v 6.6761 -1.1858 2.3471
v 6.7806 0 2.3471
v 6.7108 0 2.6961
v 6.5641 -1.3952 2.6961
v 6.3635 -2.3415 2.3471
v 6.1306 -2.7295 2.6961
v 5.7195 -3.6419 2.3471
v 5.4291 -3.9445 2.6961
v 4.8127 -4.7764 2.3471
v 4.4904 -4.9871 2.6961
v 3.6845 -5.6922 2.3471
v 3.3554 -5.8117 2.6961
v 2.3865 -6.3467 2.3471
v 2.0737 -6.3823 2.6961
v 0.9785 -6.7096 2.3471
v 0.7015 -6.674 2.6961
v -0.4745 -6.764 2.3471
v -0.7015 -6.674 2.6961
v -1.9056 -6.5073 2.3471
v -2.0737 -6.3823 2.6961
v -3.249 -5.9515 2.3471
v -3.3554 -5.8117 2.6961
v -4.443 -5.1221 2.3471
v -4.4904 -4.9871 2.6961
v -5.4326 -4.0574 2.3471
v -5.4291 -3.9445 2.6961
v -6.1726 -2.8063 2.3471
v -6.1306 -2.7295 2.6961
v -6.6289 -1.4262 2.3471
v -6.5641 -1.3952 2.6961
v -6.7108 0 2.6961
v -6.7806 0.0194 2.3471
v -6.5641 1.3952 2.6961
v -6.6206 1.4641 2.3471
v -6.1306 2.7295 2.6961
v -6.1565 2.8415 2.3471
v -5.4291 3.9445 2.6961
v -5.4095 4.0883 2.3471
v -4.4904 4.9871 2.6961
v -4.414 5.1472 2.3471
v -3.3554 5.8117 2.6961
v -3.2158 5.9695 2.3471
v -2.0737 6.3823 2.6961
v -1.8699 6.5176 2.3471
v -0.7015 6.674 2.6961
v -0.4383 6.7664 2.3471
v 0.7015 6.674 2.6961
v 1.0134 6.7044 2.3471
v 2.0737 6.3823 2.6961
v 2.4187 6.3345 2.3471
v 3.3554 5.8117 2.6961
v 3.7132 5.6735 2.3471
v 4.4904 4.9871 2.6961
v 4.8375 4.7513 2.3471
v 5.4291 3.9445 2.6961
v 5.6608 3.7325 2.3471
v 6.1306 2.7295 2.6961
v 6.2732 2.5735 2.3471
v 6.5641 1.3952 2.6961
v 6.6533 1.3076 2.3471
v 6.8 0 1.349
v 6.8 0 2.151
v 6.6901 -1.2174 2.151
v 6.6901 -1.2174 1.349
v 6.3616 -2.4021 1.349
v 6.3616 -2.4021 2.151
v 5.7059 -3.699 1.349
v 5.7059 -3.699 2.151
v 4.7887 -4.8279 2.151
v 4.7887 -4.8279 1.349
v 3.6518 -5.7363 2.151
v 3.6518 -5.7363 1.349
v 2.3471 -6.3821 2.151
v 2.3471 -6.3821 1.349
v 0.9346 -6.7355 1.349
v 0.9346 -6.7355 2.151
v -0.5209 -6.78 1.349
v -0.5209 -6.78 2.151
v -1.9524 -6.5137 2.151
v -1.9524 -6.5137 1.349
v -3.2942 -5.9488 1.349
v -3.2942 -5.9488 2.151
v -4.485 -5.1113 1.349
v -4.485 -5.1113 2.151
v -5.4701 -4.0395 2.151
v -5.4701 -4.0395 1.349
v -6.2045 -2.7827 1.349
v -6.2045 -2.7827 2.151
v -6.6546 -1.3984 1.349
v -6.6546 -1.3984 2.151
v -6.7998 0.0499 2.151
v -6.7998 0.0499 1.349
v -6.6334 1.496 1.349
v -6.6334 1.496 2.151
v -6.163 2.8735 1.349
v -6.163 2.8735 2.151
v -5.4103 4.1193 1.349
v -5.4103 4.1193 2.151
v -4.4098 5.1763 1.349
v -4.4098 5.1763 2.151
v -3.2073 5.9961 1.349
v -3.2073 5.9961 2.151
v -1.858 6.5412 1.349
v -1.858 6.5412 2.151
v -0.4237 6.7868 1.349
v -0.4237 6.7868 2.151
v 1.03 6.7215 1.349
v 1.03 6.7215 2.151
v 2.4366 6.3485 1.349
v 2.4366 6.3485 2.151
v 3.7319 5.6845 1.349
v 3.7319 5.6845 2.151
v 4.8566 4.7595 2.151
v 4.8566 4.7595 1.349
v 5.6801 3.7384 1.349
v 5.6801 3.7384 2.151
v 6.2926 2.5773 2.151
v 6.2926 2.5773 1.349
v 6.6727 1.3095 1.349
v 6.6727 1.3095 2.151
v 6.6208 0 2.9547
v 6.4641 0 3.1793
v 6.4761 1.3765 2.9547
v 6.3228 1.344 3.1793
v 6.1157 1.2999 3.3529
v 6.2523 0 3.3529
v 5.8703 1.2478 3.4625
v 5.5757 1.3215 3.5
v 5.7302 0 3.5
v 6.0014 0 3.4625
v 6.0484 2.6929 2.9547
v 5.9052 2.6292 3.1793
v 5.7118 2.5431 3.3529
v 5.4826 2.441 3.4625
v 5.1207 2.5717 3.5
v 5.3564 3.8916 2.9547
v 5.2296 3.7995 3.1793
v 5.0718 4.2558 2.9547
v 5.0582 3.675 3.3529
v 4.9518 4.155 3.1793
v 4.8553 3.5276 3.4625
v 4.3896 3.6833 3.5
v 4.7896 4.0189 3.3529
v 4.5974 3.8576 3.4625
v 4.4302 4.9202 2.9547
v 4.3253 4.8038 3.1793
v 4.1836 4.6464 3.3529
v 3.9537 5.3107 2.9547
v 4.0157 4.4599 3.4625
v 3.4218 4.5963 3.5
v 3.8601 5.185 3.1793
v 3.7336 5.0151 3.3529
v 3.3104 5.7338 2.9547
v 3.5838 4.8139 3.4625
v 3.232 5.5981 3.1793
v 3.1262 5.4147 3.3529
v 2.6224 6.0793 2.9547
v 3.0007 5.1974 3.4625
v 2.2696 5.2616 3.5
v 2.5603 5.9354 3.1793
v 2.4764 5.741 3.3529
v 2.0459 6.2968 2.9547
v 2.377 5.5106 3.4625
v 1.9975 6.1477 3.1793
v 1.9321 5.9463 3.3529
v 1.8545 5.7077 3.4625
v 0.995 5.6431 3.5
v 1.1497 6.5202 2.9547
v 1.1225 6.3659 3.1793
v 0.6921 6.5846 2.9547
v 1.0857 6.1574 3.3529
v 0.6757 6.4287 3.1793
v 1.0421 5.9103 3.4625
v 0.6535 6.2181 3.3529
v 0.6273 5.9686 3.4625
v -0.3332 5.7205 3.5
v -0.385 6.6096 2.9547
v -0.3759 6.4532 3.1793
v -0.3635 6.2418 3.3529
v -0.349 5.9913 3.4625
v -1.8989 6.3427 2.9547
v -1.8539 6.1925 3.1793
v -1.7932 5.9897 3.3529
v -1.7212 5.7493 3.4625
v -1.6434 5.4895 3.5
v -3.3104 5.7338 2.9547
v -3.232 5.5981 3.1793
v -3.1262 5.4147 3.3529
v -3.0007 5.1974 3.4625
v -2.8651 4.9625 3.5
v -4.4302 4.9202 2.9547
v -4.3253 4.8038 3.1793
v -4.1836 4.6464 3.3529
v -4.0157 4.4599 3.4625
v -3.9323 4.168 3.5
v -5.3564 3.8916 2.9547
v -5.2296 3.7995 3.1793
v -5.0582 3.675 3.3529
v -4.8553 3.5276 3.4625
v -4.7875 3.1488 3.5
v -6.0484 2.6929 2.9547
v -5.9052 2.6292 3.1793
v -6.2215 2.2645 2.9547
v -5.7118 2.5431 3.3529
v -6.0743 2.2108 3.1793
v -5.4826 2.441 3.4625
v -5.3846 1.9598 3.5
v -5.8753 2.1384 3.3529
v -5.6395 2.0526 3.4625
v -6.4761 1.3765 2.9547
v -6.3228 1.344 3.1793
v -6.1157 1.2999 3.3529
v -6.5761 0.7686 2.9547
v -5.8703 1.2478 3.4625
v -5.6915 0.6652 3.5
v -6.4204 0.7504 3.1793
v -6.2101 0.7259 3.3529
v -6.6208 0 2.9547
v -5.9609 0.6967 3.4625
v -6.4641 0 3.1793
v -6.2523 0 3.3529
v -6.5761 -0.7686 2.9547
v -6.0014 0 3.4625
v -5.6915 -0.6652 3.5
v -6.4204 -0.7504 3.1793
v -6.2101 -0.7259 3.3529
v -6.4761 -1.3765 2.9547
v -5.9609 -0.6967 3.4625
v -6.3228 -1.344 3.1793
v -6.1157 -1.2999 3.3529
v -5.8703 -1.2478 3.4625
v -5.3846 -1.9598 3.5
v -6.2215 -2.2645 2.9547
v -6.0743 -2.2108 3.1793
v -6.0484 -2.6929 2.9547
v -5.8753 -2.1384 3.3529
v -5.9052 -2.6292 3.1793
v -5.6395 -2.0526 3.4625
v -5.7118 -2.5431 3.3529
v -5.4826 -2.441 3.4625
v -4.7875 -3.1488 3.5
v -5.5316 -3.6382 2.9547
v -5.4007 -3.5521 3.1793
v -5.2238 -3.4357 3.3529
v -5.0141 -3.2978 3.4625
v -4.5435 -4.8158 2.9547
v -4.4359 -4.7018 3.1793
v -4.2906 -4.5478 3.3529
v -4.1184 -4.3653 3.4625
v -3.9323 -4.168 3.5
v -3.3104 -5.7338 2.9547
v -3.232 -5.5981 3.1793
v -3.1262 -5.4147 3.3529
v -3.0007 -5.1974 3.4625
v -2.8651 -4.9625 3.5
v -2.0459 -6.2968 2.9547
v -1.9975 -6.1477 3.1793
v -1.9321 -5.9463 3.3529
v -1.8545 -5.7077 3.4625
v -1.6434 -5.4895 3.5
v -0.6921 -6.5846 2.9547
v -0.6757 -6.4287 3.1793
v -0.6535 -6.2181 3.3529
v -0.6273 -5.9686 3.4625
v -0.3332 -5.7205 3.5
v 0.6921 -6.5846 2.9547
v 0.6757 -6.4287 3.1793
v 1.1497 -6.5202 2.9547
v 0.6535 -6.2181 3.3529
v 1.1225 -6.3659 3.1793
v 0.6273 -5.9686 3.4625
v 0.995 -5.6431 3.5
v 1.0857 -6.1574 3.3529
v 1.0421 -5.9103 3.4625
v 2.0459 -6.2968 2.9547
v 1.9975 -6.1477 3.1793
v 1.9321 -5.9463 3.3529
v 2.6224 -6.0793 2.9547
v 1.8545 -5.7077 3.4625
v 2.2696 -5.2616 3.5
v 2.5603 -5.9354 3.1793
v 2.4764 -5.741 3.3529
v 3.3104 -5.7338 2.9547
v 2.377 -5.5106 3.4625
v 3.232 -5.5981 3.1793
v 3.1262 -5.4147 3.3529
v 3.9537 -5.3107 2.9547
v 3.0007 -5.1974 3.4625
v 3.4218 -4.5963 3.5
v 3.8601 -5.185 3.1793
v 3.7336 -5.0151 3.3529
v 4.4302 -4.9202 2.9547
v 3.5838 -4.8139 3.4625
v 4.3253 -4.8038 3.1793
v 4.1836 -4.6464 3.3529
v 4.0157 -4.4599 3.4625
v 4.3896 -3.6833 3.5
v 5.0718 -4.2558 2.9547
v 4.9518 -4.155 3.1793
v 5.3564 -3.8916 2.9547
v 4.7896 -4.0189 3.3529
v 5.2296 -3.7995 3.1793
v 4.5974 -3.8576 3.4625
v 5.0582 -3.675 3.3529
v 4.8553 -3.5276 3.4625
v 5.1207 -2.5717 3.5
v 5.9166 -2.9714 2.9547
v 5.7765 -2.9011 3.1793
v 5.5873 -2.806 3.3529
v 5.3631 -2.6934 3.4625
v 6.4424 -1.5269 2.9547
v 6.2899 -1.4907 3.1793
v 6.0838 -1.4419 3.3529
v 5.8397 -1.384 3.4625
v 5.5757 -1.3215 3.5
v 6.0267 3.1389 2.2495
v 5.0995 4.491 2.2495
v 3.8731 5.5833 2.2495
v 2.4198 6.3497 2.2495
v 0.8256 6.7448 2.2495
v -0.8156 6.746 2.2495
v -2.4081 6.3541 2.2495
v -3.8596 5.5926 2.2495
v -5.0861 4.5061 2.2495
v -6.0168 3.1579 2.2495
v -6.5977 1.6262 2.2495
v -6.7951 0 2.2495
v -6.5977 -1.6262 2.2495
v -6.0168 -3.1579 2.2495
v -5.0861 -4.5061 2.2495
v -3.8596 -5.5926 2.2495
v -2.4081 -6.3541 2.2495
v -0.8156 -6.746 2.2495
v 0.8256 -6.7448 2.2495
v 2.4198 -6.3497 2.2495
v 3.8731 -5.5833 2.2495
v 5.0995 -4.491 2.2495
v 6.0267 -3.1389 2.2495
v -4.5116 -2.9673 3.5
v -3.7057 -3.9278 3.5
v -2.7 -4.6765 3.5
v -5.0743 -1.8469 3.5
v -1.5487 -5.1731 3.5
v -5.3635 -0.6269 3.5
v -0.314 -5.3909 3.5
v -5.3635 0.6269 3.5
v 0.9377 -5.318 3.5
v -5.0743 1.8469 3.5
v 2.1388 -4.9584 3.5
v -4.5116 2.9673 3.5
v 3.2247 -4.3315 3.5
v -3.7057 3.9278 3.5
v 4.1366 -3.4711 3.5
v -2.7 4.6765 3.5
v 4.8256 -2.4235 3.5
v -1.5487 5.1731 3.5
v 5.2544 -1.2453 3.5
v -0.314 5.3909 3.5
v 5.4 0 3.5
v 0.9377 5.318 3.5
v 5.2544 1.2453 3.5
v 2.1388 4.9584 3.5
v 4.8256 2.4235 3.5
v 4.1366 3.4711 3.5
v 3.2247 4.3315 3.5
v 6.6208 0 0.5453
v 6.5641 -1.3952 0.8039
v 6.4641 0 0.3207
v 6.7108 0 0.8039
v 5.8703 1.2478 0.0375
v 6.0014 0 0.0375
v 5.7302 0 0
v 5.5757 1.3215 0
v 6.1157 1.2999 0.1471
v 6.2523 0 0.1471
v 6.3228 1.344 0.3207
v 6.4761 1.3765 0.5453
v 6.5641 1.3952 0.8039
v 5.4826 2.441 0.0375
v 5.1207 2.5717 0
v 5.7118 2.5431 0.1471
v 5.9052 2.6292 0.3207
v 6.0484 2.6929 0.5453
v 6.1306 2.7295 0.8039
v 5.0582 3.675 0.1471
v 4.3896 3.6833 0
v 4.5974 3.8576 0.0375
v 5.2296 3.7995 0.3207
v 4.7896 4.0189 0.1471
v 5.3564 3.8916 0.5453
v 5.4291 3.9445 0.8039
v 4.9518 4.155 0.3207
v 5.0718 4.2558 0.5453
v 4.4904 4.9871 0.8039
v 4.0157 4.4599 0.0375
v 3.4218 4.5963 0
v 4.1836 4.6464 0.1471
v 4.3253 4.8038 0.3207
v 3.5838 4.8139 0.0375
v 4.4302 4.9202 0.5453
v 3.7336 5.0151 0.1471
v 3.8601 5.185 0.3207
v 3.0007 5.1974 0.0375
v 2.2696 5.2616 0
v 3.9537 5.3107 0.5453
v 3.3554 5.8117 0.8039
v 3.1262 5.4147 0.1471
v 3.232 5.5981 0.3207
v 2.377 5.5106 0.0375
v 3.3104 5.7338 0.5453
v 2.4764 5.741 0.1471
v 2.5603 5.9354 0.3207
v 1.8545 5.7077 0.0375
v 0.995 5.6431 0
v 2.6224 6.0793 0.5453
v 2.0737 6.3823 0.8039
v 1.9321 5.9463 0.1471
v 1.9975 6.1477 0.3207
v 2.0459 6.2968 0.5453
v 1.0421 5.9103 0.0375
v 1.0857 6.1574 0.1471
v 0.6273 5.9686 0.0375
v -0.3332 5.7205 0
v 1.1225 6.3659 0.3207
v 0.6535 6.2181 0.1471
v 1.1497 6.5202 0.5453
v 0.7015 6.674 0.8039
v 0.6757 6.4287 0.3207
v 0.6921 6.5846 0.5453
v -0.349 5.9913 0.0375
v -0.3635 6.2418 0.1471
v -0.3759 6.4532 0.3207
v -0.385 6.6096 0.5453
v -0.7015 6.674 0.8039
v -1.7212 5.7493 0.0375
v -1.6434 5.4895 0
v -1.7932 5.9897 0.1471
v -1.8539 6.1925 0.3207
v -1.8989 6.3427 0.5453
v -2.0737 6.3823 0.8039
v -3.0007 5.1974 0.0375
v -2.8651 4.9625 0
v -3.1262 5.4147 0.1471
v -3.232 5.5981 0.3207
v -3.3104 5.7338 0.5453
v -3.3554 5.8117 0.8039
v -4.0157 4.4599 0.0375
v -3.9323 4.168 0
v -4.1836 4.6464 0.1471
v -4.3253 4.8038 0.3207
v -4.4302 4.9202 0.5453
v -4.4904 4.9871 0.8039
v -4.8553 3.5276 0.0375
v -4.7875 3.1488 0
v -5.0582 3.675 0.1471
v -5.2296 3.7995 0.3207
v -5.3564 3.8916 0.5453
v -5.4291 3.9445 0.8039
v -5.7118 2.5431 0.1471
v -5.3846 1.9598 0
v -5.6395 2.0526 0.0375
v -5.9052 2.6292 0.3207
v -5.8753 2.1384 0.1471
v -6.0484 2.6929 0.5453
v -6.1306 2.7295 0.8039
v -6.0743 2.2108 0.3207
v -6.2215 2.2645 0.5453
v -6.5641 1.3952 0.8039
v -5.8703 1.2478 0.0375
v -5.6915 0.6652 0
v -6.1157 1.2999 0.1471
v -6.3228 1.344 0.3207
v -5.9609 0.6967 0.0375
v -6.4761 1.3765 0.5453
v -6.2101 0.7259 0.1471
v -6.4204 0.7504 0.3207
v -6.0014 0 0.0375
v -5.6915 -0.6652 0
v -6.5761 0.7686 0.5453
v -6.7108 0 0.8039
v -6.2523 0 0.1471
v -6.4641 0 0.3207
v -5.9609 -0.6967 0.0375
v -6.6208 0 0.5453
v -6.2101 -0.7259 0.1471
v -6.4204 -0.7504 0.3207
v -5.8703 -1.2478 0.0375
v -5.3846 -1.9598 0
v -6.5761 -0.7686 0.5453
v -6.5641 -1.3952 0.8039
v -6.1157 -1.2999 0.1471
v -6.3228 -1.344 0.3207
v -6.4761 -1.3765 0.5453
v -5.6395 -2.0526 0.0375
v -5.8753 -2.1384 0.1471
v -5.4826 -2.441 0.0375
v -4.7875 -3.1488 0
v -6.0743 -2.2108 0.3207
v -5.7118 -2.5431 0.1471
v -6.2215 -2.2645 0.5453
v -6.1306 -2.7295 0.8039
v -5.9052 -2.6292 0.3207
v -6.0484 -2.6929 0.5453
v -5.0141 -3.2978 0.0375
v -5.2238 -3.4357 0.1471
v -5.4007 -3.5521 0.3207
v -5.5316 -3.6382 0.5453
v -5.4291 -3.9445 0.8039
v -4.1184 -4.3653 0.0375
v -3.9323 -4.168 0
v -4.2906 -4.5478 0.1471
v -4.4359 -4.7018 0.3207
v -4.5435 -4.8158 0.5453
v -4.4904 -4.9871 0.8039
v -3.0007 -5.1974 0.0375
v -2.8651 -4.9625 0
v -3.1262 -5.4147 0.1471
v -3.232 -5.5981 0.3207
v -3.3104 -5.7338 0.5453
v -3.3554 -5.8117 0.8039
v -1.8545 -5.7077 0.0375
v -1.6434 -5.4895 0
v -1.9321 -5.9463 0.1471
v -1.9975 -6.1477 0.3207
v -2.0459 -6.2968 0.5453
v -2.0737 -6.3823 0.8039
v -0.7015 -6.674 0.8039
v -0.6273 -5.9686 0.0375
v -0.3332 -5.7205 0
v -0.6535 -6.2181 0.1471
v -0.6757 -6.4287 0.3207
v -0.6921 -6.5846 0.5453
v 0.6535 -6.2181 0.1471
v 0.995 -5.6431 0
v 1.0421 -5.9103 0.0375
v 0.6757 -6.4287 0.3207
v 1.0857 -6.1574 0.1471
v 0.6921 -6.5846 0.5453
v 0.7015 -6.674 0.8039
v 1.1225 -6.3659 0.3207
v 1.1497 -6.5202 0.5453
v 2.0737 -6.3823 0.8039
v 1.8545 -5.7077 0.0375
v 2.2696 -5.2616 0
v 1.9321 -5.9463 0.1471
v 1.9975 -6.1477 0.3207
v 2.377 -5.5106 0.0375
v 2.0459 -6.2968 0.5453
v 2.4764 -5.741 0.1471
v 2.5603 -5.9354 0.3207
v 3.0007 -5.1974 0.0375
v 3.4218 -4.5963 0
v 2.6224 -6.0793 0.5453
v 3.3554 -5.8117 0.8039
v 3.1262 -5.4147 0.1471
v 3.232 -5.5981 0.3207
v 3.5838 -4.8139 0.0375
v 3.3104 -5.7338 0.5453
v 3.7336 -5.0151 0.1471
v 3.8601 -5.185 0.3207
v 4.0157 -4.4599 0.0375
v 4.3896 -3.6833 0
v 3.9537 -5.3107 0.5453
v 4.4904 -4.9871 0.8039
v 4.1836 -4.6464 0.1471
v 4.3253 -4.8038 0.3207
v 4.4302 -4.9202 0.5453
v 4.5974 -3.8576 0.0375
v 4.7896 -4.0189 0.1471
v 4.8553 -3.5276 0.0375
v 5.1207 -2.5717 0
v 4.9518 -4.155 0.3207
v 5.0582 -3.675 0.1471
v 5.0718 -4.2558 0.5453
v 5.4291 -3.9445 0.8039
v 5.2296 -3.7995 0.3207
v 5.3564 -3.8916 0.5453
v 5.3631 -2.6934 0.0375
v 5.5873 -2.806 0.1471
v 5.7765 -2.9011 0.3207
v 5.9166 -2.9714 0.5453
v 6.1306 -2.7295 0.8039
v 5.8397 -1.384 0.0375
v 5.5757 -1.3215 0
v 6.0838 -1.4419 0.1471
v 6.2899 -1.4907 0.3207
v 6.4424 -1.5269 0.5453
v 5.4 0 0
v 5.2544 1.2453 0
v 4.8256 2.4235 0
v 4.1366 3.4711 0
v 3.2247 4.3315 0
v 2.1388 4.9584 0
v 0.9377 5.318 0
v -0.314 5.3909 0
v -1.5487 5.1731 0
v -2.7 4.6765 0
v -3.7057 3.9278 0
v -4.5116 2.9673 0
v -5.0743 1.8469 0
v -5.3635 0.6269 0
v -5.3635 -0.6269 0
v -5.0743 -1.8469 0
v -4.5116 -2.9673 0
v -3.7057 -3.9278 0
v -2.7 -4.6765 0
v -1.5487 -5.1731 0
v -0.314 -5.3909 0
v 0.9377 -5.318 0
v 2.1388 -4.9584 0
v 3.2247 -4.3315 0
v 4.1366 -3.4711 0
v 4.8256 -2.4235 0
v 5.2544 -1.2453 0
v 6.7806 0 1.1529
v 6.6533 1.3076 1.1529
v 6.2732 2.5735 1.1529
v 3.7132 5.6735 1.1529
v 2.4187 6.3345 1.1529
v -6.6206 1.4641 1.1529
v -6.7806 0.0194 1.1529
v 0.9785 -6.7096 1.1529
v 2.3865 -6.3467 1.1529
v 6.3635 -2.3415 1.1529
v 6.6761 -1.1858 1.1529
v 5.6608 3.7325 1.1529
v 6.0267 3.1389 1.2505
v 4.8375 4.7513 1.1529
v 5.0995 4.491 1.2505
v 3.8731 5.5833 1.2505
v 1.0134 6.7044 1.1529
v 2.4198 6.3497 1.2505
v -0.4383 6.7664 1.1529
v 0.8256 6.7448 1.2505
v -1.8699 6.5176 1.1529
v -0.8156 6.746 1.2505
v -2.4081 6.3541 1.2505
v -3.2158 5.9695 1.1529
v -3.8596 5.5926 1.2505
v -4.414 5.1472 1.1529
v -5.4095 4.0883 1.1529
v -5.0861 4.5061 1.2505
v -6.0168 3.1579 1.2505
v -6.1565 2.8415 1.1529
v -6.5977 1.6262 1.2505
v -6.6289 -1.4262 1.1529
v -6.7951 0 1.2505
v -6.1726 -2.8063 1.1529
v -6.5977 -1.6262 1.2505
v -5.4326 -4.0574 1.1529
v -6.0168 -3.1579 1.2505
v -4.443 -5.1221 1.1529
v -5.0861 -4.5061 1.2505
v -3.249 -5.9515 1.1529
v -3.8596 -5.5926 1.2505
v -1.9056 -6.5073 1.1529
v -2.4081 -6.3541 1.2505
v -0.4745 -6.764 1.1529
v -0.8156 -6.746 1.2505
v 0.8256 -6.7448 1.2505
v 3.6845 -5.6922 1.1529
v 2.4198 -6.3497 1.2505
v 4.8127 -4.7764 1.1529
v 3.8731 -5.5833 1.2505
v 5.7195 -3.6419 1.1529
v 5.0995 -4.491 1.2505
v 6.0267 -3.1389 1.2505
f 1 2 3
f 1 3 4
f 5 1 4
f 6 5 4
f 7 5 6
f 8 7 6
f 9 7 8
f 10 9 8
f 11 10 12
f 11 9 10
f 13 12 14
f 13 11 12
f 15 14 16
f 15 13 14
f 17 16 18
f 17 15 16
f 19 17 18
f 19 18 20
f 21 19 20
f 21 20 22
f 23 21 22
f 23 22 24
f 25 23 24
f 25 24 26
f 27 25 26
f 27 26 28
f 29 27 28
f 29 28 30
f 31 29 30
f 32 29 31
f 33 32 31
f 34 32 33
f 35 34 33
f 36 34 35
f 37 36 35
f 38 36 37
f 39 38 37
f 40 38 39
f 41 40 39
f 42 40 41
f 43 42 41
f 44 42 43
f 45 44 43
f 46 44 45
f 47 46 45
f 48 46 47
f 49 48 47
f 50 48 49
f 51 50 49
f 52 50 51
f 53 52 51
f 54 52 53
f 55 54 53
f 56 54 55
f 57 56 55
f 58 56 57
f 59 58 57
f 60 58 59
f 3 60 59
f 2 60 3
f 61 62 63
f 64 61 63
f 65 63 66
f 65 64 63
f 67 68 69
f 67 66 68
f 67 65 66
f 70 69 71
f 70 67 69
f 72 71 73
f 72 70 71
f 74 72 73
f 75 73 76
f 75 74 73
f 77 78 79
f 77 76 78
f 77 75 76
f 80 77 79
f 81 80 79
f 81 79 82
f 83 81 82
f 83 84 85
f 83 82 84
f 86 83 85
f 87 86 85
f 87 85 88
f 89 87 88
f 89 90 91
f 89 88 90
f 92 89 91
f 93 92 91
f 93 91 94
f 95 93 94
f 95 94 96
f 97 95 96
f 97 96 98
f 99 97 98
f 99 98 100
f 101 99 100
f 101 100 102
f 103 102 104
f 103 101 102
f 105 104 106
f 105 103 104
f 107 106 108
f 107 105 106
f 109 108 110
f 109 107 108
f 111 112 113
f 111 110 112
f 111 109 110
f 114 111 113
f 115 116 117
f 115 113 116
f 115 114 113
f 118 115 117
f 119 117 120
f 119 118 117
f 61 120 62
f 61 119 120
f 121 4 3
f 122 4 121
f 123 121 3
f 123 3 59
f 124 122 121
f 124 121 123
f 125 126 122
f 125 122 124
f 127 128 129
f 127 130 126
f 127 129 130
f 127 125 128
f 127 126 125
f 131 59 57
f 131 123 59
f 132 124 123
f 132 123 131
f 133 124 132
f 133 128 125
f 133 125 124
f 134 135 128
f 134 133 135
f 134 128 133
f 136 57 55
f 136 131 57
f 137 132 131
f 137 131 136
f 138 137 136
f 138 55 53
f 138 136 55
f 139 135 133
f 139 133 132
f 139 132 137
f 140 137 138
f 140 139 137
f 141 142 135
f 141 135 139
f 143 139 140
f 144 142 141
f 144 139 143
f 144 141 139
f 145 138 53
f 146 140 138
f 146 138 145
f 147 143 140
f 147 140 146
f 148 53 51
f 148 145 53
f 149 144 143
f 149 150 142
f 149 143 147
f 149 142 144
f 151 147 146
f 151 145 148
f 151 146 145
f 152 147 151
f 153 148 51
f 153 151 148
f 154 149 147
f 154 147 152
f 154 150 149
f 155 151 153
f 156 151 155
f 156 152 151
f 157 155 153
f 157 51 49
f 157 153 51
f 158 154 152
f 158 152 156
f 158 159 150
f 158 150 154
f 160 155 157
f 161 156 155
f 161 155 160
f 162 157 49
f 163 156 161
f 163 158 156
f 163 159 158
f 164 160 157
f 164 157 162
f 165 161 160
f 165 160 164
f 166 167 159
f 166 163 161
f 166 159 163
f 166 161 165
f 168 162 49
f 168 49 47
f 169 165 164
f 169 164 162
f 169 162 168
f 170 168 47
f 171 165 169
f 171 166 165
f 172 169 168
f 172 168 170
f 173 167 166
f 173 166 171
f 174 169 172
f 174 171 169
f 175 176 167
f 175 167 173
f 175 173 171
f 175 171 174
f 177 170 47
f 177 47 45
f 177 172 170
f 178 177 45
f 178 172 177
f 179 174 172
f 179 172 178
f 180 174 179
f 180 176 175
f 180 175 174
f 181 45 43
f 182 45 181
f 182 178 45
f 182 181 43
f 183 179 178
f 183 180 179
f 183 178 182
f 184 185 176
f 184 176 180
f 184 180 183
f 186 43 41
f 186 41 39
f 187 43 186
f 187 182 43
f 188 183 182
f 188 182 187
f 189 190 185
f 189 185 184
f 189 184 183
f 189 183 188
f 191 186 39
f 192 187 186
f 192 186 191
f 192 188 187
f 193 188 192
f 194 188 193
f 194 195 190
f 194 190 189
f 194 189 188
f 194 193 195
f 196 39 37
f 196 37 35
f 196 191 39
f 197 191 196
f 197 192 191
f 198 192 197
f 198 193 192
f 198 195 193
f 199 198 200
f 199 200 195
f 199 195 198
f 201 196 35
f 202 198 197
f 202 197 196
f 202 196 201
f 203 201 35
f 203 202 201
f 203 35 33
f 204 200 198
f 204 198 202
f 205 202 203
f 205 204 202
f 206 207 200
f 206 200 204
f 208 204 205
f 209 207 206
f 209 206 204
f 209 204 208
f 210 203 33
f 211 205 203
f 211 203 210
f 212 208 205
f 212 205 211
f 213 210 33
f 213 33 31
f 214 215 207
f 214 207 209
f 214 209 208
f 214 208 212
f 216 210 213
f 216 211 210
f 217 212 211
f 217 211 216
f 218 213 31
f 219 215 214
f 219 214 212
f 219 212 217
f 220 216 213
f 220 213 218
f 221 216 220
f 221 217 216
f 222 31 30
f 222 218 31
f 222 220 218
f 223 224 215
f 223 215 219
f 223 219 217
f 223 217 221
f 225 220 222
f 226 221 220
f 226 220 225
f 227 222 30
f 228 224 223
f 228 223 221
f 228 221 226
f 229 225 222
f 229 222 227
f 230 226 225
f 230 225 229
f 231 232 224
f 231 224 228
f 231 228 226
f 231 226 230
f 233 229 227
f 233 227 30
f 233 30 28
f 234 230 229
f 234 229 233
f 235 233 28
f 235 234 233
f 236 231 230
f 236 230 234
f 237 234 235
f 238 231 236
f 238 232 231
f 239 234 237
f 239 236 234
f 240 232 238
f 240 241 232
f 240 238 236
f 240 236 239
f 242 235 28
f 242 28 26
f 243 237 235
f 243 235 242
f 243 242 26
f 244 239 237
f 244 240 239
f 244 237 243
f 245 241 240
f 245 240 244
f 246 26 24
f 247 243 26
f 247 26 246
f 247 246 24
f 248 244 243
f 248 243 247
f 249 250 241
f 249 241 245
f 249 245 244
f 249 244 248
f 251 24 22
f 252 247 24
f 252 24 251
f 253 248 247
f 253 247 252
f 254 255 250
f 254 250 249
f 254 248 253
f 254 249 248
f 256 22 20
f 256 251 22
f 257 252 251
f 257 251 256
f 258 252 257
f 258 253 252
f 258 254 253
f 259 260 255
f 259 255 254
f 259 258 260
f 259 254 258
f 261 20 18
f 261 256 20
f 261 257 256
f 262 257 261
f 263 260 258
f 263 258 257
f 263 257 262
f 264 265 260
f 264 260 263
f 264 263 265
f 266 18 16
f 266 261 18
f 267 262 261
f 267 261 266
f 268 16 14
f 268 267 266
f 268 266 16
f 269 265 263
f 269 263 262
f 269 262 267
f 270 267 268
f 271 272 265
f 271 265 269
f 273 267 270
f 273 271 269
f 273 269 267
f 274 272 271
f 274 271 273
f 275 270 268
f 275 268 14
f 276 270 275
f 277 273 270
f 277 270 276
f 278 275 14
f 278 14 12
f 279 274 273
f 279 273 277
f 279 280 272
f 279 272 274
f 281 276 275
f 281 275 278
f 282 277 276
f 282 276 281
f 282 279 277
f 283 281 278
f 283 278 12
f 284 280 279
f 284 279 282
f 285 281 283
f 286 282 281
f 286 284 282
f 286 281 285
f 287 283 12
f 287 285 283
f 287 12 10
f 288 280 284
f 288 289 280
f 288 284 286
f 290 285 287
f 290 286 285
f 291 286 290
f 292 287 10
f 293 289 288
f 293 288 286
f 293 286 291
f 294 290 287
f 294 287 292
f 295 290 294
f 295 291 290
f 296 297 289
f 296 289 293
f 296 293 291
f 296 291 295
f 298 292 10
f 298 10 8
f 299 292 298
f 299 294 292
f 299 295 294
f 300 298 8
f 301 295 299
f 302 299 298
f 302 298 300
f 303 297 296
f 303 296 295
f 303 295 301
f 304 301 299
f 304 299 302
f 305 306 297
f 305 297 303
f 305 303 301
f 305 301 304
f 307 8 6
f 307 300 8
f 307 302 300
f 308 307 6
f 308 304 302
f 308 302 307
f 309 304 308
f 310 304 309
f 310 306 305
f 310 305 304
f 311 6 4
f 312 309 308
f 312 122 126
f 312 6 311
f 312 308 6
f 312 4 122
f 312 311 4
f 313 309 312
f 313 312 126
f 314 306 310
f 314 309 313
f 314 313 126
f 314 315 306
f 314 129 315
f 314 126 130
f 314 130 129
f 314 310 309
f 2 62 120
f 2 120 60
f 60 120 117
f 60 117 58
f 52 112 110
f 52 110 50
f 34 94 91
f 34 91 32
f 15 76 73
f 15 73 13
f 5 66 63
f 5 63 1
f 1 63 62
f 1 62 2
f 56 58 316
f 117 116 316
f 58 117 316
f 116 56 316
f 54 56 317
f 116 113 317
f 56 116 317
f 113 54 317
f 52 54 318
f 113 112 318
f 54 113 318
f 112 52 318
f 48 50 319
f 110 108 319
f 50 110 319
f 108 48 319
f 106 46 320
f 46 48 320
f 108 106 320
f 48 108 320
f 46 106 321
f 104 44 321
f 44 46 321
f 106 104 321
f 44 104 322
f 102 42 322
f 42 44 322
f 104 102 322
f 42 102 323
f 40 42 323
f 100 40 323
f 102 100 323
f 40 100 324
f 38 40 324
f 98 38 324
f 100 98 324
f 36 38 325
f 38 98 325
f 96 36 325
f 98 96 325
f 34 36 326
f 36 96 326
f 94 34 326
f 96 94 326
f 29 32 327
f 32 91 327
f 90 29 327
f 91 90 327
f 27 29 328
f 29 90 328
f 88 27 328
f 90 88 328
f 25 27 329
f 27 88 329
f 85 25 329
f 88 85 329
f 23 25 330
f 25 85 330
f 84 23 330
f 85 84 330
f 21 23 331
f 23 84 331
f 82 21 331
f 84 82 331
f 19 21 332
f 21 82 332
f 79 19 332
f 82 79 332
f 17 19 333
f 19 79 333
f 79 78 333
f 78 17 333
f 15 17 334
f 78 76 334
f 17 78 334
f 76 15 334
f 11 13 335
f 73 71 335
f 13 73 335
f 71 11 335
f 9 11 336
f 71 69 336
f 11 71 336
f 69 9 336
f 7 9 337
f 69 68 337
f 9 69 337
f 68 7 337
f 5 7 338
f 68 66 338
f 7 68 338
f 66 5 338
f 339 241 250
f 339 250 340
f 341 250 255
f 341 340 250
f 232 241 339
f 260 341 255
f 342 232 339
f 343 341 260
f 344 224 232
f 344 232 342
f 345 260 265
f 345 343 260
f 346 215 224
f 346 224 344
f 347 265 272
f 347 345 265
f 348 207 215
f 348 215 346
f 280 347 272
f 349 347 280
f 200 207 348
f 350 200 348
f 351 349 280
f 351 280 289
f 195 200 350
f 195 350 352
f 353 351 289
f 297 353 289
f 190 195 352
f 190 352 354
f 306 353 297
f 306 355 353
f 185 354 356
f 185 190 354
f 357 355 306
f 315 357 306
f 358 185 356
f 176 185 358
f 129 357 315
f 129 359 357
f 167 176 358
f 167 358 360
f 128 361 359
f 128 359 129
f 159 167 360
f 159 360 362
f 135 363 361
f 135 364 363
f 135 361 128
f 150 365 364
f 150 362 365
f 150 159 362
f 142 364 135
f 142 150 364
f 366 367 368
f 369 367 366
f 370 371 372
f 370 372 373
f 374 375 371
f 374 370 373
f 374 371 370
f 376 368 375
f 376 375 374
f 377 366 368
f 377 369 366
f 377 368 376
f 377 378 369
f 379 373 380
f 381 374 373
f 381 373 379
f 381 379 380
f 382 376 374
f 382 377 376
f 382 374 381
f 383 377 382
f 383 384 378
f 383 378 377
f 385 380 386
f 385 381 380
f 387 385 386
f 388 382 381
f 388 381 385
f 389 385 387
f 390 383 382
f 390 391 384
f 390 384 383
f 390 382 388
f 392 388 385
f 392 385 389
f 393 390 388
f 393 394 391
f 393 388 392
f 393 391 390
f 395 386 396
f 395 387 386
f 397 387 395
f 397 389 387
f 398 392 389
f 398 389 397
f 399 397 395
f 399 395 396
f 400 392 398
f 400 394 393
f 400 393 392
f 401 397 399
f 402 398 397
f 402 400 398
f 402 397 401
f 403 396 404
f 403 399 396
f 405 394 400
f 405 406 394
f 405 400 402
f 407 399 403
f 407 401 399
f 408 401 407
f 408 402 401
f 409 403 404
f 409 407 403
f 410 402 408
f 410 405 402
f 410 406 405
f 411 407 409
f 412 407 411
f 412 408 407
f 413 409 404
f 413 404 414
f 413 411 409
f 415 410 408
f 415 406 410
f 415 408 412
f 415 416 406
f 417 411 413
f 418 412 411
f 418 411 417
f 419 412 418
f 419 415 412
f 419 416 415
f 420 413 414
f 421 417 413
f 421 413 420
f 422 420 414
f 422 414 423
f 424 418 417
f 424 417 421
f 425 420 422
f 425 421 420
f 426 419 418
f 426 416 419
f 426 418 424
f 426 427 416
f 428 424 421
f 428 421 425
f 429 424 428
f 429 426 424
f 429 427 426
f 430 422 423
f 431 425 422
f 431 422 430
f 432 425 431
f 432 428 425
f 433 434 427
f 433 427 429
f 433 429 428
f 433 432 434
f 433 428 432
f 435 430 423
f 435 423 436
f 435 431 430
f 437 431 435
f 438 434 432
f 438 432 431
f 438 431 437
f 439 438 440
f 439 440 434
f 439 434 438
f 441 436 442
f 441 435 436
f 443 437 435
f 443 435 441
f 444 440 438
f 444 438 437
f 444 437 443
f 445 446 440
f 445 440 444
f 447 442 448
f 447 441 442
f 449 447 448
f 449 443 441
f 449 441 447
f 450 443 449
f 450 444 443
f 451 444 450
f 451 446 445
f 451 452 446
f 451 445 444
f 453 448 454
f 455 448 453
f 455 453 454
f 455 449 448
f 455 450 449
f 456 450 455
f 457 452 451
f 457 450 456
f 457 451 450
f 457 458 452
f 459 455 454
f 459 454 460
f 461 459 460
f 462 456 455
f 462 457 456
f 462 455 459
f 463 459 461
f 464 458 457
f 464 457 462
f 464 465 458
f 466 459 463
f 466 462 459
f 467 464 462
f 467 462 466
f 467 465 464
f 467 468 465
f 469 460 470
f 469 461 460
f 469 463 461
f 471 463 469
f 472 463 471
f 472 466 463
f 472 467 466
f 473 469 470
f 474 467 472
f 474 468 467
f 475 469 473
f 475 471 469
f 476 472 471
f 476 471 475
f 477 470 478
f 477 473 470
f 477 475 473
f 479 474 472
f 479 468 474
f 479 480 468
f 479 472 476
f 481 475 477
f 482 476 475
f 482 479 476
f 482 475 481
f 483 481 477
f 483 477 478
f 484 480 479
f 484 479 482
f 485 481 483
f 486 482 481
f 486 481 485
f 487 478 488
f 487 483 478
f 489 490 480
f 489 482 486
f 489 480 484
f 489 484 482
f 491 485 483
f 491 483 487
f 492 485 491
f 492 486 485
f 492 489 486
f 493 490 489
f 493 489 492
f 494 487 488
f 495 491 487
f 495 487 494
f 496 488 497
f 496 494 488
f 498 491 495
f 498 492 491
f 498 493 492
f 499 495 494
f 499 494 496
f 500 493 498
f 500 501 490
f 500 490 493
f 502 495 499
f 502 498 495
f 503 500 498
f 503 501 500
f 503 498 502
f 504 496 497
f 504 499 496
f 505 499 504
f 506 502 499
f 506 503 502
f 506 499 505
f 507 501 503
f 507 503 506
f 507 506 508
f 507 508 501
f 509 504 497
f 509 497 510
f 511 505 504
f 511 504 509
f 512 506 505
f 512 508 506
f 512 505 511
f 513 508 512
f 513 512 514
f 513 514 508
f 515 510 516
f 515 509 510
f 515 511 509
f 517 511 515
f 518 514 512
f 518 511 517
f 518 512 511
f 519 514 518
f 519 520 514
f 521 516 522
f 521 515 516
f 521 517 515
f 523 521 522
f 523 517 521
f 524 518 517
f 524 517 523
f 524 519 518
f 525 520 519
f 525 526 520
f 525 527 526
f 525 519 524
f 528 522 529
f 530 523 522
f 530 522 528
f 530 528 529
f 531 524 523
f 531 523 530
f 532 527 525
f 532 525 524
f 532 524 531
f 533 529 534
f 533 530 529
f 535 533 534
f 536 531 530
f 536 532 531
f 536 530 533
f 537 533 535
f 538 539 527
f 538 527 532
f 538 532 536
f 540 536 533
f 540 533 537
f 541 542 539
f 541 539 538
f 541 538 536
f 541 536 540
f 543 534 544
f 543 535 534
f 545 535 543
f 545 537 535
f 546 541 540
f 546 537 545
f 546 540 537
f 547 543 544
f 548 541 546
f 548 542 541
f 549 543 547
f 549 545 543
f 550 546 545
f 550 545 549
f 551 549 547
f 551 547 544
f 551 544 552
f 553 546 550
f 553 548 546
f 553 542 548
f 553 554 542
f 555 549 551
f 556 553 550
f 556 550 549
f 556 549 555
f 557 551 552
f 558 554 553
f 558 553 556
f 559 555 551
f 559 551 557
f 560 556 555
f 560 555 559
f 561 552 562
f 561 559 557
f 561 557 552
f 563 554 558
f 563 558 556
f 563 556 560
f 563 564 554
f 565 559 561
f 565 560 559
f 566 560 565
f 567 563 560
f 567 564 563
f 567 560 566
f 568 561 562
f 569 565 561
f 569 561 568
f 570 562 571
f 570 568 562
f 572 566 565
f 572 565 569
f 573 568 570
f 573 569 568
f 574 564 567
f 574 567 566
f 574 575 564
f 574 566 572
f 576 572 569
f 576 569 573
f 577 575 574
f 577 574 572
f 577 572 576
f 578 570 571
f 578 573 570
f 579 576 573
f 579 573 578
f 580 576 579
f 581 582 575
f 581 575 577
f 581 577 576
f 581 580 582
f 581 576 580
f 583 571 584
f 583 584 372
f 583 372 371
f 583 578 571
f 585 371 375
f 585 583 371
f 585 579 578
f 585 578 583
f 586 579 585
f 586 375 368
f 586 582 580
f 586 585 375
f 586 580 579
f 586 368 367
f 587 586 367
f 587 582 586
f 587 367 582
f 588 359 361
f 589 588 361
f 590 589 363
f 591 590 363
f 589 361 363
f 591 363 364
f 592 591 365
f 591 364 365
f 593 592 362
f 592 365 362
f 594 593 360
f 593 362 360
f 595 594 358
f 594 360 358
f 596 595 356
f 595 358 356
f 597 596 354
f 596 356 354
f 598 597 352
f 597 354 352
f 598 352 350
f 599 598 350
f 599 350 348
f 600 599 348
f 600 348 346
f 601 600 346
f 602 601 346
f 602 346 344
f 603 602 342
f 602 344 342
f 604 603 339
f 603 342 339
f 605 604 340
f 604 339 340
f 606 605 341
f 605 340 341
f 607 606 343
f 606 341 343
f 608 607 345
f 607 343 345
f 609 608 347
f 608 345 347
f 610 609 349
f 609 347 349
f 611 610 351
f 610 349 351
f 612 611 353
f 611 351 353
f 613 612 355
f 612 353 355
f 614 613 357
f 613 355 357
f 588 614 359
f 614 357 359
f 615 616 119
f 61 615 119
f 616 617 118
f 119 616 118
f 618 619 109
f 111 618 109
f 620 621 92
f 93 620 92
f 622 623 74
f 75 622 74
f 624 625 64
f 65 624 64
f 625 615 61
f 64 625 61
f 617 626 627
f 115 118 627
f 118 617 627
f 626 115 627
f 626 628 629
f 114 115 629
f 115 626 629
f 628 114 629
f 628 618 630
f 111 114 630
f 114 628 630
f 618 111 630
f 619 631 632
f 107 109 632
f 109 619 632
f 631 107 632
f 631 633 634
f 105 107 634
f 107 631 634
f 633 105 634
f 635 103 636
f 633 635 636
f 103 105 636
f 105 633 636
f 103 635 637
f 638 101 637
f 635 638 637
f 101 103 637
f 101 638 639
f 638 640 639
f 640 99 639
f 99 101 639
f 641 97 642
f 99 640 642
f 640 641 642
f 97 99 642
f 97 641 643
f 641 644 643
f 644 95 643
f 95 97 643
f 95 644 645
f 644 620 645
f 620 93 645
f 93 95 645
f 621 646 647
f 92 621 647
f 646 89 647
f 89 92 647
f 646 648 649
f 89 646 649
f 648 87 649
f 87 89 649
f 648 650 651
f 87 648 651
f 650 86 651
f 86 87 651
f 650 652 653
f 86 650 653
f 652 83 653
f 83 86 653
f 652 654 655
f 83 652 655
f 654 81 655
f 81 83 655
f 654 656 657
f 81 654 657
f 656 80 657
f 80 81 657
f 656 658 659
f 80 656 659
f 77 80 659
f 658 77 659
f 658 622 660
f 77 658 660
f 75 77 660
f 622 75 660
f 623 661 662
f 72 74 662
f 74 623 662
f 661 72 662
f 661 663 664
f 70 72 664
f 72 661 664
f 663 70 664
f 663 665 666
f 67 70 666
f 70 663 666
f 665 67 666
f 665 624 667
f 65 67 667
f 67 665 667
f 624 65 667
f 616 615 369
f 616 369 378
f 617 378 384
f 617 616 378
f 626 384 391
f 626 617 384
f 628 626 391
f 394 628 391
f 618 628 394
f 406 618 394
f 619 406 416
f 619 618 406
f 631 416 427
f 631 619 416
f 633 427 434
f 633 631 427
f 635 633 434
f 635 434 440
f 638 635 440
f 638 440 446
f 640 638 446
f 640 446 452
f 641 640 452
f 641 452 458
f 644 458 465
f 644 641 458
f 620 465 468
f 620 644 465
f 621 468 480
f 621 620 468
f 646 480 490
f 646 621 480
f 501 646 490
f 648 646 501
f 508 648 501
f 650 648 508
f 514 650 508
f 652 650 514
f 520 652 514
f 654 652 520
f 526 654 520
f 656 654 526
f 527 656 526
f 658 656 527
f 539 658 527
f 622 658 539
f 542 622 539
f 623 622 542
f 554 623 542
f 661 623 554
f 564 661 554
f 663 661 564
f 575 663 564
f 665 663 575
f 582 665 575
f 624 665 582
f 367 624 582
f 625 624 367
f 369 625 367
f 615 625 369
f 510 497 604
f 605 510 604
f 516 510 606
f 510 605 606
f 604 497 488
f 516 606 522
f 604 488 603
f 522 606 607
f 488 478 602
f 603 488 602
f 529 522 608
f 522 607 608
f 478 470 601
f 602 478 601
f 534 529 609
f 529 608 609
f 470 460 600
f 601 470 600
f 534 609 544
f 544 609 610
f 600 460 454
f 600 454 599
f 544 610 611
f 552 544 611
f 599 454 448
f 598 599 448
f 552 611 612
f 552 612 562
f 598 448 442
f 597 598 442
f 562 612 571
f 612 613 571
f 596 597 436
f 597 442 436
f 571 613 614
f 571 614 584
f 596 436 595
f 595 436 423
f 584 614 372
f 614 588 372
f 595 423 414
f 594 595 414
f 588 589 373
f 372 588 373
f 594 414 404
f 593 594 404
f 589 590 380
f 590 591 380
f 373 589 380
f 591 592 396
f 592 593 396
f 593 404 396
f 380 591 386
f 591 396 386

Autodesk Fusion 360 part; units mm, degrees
sketch "スケッチ1" plane through (0, 0, 0) normal (0, 1, 0) x (1, 0, 0)
  line L0 (0, 0) -> (5.4, 0)
  line L1 (5.4, 0) -> (5.4, -3.5)
  line L2 (5.4, -3.5) -> (6.55, -3.5)
  line L3 (6.55, -3.5) -> (6.8, -2.25)
  line L4 (6.8, -2.25) -> (6.8, -1.25)
  line L5 (6.8, -1.25) -> (6.55, 0)
  line L6 (6.55, 0) -> (5.4, 0)
  dimension "d1" = 3.5
  dimension "d3" = 5.4
  dimension "d4" = 1
  dimension "d5" = 0.25
  dimension "d8" = 6.8
revolve "回転1" add sketch "スケッチ1" angle 360 about axis through (0, 0, 1.75) along (0, 0, 1)
fillet "フィレット1" radius 1 4 edges at (-6.1067, -2.3686, 0) (-6.3398, -2.459, 1.25) (-6.3398, -2.459, 2.25) (-6.1067, -2.3686, 3.5)
equation "d8 = ( 13.6 / 2 ) * 1 mm"
